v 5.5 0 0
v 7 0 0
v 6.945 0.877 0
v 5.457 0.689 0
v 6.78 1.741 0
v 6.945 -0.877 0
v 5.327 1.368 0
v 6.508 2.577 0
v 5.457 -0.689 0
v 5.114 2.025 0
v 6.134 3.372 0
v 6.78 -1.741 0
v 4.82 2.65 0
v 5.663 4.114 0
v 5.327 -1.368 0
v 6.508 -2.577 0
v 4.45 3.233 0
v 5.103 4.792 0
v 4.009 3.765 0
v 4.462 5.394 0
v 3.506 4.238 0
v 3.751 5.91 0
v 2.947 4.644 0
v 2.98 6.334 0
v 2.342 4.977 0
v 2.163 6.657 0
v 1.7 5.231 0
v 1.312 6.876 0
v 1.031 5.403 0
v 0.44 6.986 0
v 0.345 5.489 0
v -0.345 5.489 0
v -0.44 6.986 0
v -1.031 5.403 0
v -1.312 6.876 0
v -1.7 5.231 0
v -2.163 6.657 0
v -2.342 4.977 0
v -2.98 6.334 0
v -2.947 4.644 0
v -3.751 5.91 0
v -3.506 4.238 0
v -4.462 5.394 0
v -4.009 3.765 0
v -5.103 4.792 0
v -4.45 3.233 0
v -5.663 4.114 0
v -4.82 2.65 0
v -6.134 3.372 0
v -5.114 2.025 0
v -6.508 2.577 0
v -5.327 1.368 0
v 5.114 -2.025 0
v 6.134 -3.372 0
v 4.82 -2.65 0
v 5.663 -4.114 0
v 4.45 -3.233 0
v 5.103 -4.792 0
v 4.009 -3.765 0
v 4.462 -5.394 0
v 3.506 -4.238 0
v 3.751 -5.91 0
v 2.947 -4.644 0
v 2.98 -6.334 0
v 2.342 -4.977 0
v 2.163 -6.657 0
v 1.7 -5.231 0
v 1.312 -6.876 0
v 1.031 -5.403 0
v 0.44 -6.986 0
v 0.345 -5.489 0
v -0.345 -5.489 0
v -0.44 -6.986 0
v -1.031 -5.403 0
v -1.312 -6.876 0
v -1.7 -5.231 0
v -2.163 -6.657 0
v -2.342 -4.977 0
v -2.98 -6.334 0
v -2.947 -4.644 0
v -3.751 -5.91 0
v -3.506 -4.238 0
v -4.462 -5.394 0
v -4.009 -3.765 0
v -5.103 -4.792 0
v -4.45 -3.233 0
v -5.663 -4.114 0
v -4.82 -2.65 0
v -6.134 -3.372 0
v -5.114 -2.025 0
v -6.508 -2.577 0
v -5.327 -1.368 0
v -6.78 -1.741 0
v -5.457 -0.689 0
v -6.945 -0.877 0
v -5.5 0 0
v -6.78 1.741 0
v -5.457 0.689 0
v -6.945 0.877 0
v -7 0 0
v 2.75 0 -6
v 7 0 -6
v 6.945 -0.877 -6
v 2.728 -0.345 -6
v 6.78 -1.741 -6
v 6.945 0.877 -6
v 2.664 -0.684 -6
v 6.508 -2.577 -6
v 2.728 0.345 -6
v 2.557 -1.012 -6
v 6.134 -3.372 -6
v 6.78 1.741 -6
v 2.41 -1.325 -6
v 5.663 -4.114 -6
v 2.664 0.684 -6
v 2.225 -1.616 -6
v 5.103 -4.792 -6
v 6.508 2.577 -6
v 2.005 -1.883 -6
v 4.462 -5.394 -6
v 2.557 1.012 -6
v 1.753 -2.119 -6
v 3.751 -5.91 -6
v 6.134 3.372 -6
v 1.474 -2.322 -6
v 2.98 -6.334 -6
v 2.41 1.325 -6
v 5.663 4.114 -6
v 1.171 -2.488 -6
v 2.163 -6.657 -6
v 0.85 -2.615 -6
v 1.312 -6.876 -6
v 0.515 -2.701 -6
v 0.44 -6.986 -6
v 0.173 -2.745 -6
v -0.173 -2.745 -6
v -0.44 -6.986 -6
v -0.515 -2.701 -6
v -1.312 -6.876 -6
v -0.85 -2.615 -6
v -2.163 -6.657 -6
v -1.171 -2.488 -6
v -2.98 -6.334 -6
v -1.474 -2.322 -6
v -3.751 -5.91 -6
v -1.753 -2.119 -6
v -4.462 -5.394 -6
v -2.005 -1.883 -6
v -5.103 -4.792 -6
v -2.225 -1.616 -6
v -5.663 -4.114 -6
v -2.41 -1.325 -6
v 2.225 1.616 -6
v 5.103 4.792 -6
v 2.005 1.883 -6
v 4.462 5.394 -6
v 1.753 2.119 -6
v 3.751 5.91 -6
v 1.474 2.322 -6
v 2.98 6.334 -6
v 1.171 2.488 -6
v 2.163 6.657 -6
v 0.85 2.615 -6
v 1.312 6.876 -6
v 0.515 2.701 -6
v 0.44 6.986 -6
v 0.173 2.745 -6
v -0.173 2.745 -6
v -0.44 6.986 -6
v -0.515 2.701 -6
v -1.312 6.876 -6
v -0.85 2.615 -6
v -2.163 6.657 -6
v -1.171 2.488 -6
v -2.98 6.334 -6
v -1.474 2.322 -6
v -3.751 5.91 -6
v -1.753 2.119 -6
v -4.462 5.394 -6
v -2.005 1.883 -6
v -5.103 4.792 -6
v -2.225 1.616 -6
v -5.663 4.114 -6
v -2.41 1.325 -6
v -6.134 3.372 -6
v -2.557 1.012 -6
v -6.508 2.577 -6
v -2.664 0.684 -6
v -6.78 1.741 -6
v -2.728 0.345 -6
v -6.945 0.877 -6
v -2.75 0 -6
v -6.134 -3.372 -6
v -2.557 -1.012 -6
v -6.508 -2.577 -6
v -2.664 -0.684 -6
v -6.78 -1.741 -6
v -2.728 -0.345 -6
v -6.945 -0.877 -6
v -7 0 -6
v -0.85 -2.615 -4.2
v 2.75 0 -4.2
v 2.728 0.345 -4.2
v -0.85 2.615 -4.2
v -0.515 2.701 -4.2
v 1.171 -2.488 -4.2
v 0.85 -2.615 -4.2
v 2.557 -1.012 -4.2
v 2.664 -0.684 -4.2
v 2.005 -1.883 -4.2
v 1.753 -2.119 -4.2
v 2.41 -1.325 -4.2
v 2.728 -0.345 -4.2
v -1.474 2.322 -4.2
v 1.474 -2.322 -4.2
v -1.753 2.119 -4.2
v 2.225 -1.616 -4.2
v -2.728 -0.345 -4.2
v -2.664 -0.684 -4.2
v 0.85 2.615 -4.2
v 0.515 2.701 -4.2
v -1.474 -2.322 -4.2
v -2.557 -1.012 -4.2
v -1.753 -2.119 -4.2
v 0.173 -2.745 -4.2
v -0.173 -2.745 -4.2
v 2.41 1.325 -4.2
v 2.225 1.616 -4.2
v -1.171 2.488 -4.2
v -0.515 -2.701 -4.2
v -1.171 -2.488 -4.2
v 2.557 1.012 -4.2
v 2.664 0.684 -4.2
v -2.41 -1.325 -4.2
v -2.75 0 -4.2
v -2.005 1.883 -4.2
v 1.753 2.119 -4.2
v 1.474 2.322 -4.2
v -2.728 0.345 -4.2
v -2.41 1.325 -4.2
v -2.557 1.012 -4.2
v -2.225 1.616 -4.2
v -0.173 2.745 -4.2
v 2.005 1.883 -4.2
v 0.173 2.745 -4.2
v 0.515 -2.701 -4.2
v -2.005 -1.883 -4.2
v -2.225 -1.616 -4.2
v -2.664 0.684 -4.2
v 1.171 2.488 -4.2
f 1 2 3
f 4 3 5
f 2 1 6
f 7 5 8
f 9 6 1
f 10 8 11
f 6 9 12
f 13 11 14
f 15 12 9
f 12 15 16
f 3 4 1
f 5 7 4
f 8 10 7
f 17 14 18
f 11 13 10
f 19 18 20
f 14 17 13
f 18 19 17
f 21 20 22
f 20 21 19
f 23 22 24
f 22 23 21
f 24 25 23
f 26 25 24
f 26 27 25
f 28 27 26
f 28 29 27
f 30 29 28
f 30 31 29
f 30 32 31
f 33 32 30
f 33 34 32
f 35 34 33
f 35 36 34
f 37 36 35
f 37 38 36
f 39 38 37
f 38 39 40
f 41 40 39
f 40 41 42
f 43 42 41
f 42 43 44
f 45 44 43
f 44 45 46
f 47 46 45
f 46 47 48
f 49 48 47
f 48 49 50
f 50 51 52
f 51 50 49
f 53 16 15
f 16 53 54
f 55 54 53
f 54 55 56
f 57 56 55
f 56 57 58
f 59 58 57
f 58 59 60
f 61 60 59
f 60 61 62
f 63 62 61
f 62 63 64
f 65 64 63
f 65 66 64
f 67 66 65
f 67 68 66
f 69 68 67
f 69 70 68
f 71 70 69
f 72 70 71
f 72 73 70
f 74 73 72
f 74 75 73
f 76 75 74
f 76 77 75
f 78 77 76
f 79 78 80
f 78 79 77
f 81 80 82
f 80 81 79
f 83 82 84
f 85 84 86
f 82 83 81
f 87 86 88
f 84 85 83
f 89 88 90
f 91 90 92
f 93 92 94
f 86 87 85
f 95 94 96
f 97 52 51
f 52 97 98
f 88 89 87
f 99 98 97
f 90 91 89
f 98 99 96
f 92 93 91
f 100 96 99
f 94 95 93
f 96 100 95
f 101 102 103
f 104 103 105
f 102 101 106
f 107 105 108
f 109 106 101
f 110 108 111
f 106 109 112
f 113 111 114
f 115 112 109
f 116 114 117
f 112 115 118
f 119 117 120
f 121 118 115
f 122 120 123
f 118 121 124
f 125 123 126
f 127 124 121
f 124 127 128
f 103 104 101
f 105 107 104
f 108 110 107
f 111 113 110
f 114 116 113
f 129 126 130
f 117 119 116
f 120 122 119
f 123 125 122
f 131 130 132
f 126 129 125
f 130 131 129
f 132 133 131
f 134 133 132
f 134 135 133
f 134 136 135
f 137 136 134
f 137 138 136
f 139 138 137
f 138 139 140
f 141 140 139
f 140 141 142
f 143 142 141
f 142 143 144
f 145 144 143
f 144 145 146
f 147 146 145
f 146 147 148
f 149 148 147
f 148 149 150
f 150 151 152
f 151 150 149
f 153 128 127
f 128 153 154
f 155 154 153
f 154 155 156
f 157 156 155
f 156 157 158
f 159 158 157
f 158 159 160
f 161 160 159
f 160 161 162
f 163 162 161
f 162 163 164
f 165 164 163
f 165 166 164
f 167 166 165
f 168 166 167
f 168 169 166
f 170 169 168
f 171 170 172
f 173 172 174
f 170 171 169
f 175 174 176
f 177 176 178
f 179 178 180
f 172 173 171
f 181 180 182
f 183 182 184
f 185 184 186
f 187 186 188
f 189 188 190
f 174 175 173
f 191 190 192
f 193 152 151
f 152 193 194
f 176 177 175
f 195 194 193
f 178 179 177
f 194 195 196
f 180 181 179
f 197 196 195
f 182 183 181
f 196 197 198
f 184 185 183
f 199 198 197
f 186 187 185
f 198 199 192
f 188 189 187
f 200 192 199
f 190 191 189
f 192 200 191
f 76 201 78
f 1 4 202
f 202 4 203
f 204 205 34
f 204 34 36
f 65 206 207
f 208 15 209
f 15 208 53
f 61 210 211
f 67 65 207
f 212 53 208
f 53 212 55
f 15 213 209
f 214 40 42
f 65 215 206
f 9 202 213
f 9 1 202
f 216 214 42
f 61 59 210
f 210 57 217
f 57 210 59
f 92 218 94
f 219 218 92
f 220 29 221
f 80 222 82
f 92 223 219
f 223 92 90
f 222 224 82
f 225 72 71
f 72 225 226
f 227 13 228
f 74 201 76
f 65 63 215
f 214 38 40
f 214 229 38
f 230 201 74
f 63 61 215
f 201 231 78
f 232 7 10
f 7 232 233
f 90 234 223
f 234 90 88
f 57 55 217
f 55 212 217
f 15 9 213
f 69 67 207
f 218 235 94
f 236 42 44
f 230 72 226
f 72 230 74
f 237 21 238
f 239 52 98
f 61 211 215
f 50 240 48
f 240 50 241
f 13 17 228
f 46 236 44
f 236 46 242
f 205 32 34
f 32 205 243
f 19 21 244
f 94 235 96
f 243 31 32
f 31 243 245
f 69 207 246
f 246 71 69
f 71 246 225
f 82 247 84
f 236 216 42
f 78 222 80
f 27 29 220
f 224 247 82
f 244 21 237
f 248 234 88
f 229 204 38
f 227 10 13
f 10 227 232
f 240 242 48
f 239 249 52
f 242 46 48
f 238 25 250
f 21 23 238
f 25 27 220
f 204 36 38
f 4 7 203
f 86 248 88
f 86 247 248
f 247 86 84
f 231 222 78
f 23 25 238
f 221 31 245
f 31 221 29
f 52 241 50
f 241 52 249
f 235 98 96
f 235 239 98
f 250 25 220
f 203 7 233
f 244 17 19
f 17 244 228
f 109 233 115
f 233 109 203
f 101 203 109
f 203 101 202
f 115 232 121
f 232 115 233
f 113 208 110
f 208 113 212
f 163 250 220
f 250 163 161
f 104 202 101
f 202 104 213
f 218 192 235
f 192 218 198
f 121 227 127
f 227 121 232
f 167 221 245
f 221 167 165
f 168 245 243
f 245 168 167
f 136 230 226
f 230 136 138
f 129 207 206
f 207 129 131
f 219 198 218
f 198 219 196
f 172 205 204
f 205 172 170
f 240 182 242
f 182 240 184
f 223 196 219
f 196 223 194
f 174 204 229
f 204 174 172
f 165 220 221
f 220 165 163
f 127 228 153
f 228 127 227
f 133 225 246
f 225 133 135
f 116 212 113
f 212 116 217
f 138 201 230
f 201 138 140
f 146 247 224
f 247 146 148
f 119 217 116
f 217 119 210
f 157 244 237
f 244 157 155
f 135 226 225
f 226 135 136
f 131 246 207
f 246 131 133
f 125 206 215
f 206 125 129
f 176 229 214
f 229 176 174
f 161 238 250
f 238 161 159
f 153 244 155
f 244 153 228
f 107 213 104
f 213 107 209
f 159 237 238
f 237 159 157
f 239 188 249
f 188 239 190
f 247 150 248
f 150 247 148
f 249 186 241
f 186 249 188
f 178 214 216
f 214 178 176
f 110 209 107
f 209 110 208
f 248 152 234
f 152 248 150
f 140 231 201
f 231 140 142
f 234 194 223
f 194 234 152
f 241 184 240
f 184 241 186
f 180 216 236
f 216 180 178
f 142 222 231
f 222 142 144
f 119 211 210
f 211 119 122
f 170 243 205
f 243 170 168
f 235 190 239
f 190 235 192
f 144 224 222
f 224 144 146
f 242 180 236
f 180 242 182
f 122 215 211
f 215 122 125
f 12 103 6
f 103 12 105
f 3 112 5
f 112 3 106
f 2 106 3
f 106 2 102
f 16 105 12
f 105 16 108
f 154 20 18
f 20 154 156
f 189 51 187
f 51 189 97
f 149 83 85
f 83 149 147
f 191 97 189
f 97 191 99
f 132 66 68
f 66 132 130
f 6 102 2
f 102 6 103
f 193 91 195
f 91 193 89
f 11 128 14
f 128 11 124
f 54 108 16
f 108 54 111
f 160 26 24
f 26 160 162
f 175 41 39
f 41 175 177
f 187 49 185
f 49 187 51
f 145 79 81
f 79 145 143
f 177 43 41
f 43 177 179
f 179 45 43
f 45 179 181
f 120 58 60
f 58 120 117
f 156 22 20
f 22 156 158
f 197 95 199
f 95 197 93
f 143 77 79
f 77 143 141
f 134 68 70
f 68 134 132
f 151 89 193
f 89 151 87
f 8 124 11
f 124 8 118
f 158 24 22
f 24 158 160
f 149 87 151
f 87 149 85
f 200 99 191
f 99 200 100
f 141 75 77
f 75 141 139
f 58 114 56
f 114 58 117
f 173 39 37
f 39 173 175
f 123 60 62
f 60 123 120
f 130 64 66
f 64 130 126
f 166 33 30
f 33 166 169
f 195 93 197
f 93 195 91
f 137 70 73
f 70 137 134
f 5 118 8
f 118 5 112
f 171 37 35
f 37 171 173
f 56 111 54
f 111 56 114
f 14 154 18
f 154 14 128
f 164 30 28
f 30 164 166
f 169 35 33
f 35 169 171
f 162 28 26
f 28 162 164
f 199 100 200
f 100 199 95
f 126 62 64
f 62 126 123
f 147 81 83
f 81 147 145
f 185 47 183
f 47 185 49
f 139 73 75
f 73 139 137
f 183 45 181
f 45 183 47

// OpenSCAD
$fn = 50;


difference() {
	union() {
		translate(v = [0, 0, -6.0000000000]) {
			cylinder(h = 6, r = 7.0000000000);
		}
		cylinder(h = 0, r = 10.0000000000);
	}
	union() {
		translate(v = [0, 0, 0]) {
			rotate(a = [0, 0, 0]) {
				difference() {
					union() {
						#translate(v = [0, 0, -6.0000000000]) {
							cylinder(h = 6, r = 2.2500000000);
						}
						#translate(v = [0, 0, -4.2000000000]) {
							cylinder(h = 4.2000000000, r = 7.0000000000, r1 = 2.7500000000, r2 = 5.5000000000);
						}
						#translate(v = [0, 0, -6.0000000000]) {
							cylinder(h = 6, r = 2.7500000000);
						}
						#translate(v = [0, 0, -6.0000000000]) {
							cylinder(h = 6, r = 2.2500000000);
						}
					}
					union();
				}
			}
		}
	}
}
